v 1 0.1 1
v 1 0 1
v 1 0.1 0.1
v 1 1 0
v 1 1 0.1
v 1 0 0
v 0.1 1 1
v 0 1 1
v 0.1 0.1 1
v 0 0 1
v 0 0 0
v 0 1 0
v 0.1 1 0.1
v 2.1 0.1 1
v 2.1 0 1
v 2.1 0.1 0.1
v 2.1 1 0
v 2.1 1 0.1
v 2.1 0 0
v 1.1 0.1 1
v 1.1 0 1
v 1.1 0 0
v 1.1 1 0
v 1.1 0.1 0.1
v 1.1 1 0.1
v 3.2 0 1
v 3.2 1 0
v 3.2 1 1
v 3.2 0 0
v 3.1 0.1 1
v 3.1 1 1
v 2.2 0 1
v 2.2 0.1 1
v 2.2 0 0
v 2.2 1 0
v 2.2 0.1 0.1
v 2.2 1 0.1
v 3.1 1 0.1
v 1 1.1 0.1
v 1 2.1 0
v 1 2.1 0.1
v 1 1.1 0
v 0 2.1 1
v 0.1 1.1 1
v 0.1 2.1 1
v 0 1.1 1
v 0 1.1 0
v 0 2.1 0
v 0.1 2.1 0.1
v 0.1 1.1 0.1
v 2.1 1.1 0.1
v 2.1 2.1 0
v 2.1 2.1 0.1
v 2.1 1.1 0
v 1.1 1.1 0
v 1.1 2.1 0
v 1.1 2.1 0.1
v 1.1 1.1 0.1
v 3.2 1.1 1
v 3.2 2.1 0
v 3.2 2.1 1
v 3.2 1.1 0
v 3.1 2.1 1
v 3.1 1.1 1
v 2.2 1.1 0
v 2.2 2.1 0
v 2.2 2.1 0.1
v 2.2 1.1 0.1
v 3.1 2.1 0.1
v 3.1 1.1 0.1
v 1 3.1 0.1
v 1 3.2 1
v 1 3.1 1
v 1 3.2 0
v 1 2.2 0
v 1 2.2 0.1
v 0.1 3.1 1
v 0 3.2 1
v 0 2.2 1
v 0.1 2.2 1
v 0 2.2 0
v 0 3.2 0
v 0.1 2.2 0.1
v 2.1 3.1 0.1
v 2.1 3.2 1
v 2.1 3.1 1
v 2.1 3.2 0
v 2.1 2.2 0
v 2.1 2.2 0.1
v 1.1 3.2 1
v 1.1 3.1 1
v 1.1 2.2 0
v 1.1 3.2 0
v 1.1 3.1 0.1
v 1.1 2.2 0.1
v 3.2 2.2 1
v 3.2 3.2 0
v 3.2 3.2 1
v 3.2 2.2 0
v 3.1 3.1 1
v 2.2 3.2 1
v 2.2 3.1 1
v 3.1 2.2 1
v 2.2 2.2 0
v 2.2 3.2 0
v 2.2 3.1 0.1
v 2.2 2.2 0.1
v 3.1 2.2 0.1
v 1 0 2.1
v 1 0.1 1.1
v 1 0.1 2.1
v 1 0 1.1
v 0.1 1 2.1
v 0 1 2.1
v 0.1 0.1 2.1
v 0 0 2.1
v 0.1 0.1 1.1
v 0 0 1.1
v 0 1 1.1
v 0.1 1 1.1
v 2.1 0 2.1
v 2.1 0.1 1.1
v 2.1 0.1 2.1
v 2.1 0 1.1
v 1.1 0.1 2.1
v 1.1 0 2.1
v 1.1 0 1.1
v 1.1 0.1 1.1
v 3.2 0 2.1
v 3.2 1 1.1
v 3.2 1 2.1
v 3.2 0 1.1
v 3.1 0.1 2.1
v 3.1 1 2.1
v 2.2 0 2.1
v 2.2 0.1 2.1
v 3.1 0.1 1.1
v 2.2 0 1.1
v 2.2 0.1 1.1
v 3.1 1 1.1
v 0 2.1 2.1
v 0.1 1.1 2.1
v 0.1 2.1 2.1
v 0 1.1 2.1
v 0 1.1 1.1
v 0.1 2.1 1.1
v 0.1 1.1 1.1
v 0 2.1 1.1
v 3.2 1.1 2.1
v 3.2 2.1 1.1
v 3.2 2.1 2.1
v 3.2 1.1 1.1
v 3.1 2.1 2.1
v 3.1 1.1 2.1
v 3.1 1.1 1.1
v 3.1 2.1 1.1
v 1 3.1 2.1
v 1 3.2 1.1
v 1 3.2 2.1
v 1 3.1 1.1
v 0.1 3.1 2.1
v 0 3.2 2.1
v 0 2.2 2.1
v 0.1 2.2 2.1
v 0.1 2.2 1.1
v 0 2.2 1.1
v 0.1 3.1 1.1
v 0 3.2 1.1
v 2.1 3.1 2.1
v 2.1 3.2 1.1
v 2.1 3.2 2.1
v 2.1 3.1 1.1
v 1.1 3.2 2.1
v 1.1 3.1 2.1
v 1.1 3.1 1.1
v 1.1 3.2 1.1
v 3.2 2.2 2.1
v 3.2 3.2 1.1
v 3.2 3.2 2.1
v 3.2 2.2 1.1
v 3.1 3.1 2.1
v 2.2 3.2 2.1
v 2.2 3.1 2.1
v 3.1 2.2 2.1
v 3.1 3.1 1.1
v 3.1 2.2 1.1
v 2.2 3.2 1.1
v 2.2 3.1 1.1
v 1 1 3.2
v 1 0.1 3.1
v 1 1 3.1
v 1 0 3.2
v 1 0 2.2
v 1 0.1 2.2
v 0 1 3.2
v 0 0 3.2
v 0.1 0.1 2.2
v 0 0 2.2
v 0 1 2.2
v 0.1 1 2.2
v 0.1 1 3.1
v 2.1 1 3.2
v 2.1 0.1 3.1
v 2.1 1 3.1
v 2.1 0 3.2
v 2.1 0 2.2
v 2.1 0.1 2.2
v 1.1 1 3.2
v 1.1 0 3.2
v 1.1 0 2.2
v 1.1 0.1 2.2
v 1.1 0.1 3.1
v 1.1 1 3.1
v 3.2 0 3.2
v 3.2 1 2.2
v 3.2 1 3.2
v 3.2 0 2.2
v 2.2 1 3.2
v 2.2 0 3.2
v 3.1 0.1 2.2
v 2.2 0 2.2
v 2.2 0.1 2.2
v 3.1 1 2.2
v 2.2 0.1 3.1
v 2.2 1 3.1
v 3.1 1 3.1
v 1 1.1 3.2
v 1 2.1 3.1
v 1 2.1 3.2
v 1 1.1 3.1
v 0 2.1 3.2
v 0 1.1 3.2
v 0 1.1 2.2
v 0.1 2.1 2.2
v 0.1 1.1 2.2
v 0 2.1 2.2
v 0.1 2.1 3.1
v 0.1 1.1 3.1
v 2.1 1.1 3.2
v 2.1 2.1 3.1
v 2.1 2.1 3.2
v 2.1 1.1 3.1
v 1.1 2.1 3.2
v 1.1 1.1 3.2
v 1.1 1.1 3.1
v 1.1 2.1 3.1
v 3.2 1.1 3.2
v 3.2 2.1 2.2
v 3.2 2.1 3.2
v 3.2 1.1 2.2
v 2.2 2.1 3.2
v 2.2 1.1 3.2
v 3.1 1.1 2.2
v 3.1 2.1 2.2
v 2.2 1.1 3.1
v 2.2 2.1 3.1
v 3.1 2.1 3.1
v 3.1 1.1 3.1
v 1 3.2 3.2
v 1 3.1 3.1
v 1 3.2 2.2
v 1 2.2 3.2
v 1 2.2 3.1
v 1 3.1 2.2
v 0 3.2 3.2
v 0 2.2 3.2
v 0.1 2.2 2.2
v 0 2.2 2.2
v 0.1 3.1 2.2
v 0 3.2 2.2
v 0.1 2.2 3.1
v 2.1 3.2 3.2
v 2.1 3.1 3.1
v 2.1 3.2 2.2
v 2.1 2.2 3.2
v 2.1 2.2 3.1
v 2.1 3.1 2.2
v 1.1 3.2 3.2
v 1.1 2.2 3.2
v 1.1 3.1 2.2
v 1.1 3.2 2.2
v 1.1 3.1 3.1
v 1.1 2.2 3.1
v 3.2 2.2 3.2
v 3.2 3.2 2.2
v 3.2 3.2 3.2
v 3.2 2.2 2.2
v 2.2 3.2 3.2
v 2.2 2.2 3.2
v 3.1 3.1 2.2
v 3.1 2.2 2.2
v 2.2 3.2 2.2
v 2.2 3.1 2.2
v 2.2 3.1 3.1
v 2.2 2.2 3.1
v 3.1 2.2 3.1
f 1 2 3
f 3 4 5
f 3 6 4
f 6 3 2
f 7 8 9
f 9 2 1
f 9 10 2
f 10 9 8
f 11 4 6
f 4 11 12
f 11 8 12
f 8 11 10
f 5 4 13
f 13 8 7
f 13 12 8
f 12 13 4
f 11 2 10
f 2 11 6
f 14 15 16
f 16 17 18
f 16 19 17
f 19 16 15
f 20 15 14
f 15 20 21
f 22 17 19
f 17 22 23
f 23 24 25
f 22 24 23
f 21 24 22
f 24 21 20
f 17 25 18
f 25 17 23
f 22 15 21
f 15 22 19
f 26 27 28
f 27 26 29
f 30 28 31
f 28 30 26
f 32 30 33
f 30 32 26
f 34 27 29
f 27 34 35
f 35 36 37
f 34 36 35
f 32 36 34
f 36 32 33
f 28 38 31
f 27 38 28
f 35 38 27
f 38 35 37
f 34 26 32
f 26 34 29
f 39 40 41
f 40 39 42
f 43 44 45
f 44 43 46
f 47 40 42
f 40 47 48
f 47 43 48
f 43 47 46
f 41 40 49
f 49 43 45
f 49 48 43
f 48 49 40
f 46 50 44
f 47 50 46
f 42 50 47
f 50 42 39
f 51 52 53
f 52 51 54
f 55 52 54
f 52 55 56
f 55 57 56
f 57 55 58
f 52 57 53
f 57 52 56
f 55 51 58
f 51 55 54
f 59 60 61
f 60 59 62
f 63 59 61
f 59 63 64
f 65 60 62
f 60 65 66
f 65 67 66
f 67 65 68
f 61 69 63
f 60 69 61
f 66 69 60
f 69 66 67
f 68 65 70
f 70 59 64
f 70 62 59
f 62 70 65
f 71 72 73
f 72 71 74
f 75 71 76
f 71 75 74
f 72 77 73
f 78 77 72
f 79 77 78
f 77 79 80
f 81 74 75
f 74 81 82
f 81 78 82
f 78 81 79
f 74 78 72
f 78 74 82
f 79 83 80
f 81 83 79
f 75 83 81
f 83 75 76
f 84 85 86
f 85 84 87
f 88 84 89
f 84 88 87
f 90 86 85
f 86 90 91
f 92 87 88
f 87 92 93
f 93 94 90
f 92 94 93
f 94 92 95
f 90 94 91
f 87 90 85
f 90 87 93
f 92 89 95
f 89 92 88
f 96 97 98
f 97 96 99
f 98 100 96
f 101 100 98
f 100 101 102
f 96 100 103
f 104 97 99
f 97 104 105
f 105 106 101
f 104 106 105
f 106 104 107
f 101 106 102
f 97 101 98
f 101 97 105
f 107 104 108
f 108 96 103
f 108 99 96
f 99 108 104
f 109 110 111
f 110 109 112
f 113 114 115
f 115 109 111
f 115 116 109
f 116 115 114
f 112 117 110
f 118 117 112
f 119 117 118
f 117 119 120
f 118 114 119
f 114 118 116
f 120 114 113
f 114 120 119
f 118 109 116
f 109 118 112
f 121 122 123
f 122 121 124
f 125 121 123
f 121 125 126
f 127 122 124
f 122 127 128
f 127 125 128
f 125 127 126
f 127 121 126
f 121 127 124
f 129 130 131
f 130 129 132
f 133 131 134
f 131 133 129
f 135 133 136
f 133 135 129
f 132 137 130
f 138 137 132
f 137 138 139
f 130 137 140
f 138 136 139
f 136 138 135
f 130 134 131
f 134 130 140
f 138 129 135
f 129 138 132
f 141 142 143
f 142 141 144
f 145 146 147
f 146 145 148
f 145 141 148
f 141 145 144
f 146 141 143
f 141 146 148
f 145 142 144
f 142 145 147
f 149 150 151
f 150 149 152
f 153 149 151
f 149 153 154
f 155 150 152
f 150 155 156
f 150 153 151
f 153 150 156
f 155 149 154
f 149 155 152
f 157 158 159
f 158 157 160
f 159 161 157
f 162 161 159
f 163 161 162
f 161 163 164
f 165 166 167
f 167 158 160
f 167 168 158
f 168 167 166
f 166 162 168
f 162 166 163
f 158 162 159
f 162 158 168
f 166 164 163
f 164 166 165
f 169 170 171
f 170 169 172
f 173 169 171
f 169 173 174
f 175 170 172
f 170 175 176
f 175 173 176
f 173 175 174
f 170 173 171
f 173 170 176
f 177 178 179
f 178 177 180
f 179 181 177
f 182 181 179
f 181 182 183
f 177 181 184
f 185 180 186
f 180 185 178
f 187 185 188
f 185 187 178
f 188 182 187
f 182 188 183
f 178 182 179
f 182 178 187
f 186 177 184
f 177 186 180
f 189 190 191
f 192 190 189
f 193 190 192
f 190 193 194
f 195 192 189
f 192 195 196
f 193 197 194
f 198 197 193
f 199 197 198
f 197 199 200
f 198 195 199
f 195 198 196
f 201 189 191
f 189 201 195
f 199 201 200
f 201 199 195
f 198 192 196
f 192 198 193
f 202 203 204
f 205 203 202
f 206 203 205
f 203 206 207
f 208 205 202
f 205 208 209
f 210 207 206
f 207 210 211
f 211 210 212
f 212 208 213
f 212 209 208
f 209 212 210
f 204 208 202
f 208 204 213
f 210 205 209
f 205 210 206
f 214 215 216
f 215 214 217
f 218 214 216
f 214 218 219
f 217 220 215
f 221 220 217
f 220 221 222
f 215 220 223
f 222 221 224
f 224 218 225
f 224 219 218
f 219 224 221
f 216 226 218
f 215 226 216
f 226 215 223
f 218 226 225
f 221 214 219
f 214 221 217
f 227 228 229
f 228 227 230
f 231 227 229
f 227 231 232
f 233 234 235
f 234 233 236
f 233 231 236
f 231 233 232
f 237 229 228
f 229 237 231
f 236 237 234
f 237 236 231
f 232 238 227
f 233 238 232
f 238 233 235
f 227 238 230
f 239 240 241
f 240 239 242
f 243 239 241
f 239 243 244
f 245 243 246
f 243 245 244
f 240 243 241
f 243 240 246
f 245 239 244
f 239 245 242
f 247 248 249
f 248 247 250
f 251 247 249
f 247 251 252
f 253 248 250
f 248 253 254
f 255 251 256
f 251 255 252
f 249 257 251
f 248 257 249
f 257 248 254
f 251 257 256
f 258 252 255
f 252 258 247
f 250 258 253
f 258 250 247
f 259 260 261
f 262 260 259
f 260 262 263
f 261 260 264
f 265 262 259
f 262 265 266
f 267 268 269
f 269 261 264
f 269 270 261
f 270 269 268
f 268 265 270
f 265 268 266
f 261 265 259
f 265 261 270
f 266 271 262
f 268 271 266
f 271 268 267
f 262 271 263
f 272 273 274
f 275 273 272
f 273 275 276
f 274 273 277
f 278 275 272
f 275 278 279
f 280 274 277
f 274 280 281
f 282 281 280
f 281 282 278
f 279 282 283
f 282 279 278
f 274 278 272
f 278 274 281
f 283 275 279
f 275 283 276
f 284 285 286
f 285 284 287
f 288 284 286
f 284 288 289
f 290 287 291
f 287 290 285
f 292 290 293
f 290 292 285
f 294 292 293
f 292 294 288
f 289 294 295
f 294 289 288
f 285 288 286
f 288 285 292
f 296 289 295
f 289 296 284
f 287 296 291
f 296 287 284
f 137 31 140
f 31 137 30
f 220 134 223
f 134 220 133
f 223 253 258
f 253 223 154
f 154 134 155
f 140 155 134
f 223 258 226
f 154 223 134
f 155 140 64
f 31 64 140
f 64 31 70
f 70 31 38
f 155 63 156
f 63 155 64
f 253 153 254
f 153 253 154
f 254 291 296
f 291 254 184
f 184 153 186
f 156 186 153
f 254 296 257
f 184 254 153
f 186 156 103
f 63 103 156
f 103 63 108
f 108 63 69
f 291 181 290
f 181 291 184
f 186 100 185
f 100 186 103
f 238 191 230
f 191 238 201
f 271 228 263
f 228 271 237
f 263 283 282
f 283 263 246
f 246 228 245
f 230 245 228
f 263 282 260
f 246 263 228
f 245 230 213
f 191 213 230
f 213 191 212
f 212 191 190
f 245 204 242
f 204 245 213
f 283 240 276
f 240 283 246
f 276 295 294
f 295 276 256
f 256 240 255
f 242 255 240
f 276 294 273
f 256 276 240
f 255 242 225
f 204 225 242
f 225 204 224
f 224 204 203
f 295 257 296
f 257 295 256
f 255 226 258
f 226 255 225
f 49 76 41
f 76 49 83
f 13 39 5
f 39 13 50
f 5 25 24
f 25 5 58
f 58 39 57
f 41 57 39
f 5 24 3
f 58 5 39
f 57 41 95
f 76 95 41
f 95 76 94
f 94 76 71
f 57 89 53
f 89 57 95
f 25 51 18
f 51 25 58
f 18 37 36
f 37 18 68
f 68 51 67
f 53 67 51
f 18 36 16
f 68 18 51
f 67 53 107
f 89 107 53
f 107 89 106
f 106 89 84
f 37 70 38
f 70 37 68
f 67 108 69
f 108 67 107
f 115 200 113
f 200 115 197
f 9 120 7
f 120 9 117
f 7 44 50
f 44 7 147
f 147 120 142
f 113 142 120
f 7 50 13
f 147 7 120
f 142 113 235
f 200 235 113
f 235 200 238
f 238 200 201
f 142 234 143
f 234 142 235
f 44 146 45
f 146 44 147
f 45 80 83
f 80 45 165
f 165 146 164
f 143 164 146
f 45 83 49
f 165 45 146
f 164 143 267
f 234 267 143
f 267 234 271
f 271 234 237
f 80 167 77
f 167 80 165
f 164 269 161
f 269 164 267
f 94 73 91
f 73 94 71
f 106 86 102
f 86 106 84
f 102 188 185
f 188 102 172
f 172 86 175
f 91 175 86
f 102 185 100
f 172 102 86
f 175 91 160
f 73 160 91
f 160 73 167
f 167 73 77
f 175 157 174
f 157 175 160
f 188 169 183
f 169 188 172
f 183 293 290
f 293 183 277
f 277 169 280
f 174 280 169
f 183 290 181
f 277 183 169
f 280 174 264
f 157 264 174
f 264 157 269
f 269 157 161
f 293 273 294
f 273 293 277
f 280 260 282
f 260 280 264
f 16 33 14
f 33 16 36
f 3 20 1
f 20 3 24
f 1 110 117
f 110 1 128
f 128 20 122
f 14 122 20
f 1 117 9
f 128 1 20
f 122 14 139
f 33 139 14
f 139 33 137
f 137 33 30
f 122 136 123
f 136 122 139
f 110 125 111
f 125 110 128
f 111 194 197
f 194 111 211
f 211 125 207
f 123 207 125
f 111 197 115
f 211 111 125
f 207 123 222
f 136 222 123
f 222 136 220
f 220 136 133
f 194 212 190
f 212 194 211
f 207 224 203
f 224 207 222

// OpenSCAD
//Cube Generator with Inset
//created 2013-11-18
//collaboration between Jonathan Schmid (@schmidjon and Michael Frey (@ChickenCutlass)

//variables, whole numbers only

// Cube Size
cube_size = 2; //[0, 1, 2, 3]
// Number of Cubes in X Axis (whole numbers only)
x_var = 3;
// Number of Cubes in Y Axis (whole numbers only)
y_var= 3;
// Number of Cubes in z Axis (whole numbers only)
z = 3;
// Inset amount
inset = .1; //[.1,.2,.3,.4,.5,.6,.7]

// create inner cube with insets on all sides
translate([inset,inset,inset]){
cube([x_var+(inset*(x_var-1))-(inset*2),y_var+(inset*(y_var-1))-(inset*2),z+(inset*(z-1))-(inset*2)]);
}

//create grid of cubes

for ( z = [0:z-1]) {
	for ( x = [0:y_var-1]) {
		for ( i = [0:x_var-1]) {
			translate([i*(1+inset),x*(1+inset),z*(1+inset)]) {
				cube([cube_size]);
			}
		}
	}
}
